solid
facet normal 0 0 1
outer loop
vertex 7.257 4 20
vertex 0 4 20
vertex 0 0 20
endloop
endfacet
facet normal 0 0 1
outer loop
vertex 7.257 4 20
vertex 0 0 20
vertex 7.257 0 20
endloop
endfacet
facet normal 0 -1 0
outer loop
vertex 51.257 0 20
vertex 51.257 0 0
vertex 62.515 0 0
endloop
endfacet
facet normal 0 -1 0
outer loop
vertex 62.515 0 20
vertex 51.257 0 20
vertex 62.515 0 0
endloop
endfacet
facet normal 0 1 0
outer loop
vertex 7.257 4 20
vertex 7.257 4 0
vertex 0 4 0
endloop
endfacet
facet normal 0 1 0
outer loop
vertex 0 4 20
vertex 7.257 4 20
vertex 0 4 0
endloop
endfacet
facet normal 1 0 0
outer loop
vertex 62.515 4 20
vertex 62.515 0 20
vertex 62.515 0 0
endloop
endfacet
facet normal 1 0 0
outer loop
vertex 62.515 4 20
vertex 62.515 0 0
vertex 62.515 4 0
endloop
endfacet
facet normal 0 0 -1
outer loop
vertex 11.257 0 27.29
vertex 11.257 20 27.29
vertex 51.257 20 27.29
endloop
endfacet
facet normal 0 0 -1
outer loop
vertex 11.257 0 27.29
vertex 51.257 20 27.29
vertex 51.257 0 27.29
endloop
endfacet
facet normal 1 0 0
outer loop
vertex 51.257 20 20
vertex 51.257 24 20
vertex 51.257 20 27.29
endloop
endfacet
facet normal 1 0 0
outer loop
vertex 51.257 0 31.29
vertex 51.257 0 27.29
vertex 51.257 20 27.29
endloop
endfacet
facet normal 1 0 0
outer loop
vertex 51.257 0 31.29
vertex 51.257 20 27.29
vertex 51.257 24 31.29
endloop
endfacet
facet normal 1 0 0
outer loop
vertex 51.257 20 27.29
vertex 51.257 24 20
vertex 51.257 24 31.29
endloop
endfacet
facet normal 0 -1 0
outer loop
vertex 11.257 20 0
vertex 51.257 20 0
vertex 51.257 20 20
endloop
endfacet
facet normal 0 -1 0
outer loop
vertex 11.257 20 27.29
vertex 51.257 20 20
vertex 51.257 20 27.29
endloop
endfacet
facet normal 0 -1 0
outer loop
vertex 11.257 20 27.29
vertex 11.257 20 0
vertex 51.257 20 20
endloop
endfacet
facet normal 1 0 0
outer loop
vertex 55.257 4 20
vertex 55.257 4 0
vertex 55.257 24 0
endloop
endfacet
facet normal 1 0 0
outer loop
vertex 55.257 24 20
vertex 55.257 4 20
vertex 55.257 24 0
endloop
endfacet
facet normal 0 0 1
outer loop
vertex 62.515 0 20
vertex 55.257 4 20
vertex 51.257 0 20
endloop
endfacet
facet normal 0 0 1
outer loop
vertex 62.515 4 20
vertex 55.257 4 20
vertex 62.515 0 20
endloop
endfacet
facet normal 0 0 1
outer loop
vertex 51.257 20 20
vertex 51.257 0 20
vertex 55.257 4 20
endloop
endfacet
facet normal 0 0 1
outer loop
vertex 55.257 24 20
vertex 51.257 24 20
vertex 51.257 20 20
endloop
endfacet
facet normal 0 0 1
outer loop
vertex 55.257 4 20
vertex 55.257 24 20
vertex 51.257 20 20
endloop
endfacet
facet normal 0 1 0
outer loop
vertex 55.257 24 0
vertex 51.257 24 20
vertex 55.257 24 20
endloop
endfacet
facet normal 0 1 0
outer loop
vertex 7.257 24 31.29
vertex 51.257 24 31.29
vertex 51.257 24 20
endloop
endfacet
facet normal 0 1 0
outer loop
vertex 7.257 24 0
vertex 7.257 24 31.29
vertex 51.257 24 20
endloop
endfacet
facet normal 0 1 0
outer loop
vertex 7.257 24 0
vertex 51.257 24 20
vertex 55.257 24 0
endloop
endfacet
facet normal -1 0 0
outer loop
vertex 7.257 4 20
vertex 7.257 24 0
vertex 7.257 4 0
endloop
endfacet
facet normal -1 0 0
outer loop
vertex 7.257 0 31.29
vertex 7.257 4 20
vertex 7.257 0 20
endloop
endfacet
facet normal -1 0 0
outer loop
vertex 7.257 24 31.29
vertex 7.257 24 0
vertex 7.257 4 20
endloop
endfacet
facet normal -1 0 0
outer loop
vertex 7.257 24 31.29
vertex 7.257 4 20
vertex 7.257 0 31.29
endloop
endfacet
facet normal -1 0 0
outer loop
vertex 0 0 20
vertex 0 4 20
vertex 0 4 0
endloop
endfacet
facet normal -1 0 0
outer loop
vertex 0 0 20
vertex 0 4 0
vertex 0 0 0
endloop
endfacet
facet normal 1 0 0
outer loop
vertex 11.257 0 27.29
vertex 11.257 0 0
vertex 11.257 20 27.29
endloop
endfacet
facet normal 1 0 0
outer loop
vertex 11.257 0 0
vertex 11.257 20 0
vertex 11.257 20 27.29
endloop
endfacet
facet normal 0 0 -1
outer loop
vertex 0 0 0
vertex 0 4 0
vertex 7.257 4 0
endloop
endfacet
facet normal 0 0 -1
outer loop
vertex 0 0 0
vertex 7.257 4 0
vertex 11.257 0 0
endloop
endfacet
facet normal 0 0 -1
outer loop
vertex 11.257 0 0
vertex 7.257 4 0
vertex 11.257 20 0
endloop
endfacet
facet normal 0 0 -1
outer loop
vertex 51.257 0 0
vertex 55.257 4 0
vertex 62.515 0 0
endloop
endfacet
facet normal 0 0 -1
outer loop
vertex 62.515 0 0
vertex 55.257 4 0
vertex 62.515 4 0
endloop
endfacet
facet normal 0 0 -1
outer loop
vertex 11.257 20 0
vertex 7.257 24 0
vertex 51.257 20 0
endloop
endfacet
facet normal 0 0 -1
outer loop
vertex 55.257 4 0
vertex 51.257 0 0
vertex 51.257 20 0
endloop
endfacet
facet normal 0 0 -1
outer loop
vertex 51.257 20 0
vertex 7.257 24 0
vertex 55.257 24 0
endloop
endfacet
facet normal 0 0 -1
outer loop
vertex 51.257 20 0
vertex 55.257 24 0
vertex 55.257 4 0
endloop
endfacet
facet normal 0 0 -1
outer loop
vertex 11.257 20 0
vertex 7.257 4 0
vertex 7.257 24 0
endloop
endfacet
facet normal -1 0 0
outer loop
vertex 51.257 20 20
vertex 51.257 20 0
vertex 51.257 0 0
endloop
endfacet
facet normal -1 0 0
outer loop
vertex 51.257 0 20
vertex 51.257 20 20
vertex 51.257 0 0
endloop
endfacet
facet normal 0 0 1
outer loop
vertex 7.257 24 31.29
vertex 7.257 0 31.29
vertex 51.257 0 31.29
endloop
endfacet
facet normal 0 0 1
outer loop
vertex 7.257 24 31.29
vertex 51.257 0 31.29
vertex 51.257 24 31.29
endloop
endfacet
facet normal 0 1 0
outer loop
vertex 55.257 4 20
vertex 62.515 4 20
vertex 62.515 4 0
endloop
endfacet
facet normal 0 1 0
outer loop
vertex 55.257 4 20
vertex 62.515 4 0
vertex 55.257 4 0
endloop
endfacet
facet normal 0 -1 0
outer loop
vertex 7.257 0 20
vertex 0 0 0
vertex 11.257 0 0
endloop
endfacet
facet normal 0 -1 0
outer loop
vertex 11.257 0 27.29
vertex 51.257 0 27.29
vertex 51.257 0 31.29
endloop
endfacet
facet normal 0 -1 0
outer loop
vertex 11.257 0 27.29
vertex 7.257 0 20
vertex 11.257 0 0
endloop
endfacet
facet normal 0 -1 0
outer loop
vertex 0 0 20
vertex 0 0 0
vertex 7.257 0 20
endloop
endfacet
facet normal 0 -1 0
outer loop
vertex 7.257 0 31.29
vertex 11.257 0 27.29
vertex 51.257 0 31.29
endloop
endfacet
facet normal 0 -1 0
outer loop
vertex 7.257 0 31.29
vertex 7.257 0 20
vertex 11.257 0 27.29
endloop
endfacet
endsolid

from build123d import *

# Parameters (mm, degrees)
BOSS_EXTRUDE1_DEPTH = 20
BOSS_EXTRUDE2_DEPTH = 4
BOSS_EXTRUDE3_DEPTH = 44


with BuildPart() as part:
    # Sketch1 → Boss-Extrude1 (new body)
    with BuildSketch(Plane.XY):
        Polygon((0, 0), (11.25748503, 0), (11.25748503, 20), (51.25748503, 20), (51.25748503, 0), (62.51497006, 0), (62.51497006, 4), (55.25748503, 4), (55.25748503, 24), (7.25748503, 24), (7.25748503, 4), (0, 4), align=None)
    extrude(amount=BOSS_EXTRUDE1_DEPTH)

    # Sketch2 → Boss-Extrude2 (add)
    with BuildSketch(Plane.ZY.offset(-7.25748503)):
        Polygon((27.29, 20), (20, 20), (20, 4), (20, 0), (27.29, 0), align=None)
        Polygon((20, 24), (20, 20), (27.29, 20), (27.29, 0), (31.29, 0), (31.29, 24), align=None)
    extrude(amount=-BOSS_EXTRUDE2_DEPTH)

    # Sketch2<3> → Boss-Extrude3 (add)
    with BuildSketch(Plane.ZY.offset(-7.25748503)):
        Polygon((20, 24), (20, 20), (27.29, 20), (27.29, 0), (31.29, 0), (31.29, 24), align=None)
    extrude(amount=-BOSS_EXTRUDE3_DEPTH)


solid = part.part
